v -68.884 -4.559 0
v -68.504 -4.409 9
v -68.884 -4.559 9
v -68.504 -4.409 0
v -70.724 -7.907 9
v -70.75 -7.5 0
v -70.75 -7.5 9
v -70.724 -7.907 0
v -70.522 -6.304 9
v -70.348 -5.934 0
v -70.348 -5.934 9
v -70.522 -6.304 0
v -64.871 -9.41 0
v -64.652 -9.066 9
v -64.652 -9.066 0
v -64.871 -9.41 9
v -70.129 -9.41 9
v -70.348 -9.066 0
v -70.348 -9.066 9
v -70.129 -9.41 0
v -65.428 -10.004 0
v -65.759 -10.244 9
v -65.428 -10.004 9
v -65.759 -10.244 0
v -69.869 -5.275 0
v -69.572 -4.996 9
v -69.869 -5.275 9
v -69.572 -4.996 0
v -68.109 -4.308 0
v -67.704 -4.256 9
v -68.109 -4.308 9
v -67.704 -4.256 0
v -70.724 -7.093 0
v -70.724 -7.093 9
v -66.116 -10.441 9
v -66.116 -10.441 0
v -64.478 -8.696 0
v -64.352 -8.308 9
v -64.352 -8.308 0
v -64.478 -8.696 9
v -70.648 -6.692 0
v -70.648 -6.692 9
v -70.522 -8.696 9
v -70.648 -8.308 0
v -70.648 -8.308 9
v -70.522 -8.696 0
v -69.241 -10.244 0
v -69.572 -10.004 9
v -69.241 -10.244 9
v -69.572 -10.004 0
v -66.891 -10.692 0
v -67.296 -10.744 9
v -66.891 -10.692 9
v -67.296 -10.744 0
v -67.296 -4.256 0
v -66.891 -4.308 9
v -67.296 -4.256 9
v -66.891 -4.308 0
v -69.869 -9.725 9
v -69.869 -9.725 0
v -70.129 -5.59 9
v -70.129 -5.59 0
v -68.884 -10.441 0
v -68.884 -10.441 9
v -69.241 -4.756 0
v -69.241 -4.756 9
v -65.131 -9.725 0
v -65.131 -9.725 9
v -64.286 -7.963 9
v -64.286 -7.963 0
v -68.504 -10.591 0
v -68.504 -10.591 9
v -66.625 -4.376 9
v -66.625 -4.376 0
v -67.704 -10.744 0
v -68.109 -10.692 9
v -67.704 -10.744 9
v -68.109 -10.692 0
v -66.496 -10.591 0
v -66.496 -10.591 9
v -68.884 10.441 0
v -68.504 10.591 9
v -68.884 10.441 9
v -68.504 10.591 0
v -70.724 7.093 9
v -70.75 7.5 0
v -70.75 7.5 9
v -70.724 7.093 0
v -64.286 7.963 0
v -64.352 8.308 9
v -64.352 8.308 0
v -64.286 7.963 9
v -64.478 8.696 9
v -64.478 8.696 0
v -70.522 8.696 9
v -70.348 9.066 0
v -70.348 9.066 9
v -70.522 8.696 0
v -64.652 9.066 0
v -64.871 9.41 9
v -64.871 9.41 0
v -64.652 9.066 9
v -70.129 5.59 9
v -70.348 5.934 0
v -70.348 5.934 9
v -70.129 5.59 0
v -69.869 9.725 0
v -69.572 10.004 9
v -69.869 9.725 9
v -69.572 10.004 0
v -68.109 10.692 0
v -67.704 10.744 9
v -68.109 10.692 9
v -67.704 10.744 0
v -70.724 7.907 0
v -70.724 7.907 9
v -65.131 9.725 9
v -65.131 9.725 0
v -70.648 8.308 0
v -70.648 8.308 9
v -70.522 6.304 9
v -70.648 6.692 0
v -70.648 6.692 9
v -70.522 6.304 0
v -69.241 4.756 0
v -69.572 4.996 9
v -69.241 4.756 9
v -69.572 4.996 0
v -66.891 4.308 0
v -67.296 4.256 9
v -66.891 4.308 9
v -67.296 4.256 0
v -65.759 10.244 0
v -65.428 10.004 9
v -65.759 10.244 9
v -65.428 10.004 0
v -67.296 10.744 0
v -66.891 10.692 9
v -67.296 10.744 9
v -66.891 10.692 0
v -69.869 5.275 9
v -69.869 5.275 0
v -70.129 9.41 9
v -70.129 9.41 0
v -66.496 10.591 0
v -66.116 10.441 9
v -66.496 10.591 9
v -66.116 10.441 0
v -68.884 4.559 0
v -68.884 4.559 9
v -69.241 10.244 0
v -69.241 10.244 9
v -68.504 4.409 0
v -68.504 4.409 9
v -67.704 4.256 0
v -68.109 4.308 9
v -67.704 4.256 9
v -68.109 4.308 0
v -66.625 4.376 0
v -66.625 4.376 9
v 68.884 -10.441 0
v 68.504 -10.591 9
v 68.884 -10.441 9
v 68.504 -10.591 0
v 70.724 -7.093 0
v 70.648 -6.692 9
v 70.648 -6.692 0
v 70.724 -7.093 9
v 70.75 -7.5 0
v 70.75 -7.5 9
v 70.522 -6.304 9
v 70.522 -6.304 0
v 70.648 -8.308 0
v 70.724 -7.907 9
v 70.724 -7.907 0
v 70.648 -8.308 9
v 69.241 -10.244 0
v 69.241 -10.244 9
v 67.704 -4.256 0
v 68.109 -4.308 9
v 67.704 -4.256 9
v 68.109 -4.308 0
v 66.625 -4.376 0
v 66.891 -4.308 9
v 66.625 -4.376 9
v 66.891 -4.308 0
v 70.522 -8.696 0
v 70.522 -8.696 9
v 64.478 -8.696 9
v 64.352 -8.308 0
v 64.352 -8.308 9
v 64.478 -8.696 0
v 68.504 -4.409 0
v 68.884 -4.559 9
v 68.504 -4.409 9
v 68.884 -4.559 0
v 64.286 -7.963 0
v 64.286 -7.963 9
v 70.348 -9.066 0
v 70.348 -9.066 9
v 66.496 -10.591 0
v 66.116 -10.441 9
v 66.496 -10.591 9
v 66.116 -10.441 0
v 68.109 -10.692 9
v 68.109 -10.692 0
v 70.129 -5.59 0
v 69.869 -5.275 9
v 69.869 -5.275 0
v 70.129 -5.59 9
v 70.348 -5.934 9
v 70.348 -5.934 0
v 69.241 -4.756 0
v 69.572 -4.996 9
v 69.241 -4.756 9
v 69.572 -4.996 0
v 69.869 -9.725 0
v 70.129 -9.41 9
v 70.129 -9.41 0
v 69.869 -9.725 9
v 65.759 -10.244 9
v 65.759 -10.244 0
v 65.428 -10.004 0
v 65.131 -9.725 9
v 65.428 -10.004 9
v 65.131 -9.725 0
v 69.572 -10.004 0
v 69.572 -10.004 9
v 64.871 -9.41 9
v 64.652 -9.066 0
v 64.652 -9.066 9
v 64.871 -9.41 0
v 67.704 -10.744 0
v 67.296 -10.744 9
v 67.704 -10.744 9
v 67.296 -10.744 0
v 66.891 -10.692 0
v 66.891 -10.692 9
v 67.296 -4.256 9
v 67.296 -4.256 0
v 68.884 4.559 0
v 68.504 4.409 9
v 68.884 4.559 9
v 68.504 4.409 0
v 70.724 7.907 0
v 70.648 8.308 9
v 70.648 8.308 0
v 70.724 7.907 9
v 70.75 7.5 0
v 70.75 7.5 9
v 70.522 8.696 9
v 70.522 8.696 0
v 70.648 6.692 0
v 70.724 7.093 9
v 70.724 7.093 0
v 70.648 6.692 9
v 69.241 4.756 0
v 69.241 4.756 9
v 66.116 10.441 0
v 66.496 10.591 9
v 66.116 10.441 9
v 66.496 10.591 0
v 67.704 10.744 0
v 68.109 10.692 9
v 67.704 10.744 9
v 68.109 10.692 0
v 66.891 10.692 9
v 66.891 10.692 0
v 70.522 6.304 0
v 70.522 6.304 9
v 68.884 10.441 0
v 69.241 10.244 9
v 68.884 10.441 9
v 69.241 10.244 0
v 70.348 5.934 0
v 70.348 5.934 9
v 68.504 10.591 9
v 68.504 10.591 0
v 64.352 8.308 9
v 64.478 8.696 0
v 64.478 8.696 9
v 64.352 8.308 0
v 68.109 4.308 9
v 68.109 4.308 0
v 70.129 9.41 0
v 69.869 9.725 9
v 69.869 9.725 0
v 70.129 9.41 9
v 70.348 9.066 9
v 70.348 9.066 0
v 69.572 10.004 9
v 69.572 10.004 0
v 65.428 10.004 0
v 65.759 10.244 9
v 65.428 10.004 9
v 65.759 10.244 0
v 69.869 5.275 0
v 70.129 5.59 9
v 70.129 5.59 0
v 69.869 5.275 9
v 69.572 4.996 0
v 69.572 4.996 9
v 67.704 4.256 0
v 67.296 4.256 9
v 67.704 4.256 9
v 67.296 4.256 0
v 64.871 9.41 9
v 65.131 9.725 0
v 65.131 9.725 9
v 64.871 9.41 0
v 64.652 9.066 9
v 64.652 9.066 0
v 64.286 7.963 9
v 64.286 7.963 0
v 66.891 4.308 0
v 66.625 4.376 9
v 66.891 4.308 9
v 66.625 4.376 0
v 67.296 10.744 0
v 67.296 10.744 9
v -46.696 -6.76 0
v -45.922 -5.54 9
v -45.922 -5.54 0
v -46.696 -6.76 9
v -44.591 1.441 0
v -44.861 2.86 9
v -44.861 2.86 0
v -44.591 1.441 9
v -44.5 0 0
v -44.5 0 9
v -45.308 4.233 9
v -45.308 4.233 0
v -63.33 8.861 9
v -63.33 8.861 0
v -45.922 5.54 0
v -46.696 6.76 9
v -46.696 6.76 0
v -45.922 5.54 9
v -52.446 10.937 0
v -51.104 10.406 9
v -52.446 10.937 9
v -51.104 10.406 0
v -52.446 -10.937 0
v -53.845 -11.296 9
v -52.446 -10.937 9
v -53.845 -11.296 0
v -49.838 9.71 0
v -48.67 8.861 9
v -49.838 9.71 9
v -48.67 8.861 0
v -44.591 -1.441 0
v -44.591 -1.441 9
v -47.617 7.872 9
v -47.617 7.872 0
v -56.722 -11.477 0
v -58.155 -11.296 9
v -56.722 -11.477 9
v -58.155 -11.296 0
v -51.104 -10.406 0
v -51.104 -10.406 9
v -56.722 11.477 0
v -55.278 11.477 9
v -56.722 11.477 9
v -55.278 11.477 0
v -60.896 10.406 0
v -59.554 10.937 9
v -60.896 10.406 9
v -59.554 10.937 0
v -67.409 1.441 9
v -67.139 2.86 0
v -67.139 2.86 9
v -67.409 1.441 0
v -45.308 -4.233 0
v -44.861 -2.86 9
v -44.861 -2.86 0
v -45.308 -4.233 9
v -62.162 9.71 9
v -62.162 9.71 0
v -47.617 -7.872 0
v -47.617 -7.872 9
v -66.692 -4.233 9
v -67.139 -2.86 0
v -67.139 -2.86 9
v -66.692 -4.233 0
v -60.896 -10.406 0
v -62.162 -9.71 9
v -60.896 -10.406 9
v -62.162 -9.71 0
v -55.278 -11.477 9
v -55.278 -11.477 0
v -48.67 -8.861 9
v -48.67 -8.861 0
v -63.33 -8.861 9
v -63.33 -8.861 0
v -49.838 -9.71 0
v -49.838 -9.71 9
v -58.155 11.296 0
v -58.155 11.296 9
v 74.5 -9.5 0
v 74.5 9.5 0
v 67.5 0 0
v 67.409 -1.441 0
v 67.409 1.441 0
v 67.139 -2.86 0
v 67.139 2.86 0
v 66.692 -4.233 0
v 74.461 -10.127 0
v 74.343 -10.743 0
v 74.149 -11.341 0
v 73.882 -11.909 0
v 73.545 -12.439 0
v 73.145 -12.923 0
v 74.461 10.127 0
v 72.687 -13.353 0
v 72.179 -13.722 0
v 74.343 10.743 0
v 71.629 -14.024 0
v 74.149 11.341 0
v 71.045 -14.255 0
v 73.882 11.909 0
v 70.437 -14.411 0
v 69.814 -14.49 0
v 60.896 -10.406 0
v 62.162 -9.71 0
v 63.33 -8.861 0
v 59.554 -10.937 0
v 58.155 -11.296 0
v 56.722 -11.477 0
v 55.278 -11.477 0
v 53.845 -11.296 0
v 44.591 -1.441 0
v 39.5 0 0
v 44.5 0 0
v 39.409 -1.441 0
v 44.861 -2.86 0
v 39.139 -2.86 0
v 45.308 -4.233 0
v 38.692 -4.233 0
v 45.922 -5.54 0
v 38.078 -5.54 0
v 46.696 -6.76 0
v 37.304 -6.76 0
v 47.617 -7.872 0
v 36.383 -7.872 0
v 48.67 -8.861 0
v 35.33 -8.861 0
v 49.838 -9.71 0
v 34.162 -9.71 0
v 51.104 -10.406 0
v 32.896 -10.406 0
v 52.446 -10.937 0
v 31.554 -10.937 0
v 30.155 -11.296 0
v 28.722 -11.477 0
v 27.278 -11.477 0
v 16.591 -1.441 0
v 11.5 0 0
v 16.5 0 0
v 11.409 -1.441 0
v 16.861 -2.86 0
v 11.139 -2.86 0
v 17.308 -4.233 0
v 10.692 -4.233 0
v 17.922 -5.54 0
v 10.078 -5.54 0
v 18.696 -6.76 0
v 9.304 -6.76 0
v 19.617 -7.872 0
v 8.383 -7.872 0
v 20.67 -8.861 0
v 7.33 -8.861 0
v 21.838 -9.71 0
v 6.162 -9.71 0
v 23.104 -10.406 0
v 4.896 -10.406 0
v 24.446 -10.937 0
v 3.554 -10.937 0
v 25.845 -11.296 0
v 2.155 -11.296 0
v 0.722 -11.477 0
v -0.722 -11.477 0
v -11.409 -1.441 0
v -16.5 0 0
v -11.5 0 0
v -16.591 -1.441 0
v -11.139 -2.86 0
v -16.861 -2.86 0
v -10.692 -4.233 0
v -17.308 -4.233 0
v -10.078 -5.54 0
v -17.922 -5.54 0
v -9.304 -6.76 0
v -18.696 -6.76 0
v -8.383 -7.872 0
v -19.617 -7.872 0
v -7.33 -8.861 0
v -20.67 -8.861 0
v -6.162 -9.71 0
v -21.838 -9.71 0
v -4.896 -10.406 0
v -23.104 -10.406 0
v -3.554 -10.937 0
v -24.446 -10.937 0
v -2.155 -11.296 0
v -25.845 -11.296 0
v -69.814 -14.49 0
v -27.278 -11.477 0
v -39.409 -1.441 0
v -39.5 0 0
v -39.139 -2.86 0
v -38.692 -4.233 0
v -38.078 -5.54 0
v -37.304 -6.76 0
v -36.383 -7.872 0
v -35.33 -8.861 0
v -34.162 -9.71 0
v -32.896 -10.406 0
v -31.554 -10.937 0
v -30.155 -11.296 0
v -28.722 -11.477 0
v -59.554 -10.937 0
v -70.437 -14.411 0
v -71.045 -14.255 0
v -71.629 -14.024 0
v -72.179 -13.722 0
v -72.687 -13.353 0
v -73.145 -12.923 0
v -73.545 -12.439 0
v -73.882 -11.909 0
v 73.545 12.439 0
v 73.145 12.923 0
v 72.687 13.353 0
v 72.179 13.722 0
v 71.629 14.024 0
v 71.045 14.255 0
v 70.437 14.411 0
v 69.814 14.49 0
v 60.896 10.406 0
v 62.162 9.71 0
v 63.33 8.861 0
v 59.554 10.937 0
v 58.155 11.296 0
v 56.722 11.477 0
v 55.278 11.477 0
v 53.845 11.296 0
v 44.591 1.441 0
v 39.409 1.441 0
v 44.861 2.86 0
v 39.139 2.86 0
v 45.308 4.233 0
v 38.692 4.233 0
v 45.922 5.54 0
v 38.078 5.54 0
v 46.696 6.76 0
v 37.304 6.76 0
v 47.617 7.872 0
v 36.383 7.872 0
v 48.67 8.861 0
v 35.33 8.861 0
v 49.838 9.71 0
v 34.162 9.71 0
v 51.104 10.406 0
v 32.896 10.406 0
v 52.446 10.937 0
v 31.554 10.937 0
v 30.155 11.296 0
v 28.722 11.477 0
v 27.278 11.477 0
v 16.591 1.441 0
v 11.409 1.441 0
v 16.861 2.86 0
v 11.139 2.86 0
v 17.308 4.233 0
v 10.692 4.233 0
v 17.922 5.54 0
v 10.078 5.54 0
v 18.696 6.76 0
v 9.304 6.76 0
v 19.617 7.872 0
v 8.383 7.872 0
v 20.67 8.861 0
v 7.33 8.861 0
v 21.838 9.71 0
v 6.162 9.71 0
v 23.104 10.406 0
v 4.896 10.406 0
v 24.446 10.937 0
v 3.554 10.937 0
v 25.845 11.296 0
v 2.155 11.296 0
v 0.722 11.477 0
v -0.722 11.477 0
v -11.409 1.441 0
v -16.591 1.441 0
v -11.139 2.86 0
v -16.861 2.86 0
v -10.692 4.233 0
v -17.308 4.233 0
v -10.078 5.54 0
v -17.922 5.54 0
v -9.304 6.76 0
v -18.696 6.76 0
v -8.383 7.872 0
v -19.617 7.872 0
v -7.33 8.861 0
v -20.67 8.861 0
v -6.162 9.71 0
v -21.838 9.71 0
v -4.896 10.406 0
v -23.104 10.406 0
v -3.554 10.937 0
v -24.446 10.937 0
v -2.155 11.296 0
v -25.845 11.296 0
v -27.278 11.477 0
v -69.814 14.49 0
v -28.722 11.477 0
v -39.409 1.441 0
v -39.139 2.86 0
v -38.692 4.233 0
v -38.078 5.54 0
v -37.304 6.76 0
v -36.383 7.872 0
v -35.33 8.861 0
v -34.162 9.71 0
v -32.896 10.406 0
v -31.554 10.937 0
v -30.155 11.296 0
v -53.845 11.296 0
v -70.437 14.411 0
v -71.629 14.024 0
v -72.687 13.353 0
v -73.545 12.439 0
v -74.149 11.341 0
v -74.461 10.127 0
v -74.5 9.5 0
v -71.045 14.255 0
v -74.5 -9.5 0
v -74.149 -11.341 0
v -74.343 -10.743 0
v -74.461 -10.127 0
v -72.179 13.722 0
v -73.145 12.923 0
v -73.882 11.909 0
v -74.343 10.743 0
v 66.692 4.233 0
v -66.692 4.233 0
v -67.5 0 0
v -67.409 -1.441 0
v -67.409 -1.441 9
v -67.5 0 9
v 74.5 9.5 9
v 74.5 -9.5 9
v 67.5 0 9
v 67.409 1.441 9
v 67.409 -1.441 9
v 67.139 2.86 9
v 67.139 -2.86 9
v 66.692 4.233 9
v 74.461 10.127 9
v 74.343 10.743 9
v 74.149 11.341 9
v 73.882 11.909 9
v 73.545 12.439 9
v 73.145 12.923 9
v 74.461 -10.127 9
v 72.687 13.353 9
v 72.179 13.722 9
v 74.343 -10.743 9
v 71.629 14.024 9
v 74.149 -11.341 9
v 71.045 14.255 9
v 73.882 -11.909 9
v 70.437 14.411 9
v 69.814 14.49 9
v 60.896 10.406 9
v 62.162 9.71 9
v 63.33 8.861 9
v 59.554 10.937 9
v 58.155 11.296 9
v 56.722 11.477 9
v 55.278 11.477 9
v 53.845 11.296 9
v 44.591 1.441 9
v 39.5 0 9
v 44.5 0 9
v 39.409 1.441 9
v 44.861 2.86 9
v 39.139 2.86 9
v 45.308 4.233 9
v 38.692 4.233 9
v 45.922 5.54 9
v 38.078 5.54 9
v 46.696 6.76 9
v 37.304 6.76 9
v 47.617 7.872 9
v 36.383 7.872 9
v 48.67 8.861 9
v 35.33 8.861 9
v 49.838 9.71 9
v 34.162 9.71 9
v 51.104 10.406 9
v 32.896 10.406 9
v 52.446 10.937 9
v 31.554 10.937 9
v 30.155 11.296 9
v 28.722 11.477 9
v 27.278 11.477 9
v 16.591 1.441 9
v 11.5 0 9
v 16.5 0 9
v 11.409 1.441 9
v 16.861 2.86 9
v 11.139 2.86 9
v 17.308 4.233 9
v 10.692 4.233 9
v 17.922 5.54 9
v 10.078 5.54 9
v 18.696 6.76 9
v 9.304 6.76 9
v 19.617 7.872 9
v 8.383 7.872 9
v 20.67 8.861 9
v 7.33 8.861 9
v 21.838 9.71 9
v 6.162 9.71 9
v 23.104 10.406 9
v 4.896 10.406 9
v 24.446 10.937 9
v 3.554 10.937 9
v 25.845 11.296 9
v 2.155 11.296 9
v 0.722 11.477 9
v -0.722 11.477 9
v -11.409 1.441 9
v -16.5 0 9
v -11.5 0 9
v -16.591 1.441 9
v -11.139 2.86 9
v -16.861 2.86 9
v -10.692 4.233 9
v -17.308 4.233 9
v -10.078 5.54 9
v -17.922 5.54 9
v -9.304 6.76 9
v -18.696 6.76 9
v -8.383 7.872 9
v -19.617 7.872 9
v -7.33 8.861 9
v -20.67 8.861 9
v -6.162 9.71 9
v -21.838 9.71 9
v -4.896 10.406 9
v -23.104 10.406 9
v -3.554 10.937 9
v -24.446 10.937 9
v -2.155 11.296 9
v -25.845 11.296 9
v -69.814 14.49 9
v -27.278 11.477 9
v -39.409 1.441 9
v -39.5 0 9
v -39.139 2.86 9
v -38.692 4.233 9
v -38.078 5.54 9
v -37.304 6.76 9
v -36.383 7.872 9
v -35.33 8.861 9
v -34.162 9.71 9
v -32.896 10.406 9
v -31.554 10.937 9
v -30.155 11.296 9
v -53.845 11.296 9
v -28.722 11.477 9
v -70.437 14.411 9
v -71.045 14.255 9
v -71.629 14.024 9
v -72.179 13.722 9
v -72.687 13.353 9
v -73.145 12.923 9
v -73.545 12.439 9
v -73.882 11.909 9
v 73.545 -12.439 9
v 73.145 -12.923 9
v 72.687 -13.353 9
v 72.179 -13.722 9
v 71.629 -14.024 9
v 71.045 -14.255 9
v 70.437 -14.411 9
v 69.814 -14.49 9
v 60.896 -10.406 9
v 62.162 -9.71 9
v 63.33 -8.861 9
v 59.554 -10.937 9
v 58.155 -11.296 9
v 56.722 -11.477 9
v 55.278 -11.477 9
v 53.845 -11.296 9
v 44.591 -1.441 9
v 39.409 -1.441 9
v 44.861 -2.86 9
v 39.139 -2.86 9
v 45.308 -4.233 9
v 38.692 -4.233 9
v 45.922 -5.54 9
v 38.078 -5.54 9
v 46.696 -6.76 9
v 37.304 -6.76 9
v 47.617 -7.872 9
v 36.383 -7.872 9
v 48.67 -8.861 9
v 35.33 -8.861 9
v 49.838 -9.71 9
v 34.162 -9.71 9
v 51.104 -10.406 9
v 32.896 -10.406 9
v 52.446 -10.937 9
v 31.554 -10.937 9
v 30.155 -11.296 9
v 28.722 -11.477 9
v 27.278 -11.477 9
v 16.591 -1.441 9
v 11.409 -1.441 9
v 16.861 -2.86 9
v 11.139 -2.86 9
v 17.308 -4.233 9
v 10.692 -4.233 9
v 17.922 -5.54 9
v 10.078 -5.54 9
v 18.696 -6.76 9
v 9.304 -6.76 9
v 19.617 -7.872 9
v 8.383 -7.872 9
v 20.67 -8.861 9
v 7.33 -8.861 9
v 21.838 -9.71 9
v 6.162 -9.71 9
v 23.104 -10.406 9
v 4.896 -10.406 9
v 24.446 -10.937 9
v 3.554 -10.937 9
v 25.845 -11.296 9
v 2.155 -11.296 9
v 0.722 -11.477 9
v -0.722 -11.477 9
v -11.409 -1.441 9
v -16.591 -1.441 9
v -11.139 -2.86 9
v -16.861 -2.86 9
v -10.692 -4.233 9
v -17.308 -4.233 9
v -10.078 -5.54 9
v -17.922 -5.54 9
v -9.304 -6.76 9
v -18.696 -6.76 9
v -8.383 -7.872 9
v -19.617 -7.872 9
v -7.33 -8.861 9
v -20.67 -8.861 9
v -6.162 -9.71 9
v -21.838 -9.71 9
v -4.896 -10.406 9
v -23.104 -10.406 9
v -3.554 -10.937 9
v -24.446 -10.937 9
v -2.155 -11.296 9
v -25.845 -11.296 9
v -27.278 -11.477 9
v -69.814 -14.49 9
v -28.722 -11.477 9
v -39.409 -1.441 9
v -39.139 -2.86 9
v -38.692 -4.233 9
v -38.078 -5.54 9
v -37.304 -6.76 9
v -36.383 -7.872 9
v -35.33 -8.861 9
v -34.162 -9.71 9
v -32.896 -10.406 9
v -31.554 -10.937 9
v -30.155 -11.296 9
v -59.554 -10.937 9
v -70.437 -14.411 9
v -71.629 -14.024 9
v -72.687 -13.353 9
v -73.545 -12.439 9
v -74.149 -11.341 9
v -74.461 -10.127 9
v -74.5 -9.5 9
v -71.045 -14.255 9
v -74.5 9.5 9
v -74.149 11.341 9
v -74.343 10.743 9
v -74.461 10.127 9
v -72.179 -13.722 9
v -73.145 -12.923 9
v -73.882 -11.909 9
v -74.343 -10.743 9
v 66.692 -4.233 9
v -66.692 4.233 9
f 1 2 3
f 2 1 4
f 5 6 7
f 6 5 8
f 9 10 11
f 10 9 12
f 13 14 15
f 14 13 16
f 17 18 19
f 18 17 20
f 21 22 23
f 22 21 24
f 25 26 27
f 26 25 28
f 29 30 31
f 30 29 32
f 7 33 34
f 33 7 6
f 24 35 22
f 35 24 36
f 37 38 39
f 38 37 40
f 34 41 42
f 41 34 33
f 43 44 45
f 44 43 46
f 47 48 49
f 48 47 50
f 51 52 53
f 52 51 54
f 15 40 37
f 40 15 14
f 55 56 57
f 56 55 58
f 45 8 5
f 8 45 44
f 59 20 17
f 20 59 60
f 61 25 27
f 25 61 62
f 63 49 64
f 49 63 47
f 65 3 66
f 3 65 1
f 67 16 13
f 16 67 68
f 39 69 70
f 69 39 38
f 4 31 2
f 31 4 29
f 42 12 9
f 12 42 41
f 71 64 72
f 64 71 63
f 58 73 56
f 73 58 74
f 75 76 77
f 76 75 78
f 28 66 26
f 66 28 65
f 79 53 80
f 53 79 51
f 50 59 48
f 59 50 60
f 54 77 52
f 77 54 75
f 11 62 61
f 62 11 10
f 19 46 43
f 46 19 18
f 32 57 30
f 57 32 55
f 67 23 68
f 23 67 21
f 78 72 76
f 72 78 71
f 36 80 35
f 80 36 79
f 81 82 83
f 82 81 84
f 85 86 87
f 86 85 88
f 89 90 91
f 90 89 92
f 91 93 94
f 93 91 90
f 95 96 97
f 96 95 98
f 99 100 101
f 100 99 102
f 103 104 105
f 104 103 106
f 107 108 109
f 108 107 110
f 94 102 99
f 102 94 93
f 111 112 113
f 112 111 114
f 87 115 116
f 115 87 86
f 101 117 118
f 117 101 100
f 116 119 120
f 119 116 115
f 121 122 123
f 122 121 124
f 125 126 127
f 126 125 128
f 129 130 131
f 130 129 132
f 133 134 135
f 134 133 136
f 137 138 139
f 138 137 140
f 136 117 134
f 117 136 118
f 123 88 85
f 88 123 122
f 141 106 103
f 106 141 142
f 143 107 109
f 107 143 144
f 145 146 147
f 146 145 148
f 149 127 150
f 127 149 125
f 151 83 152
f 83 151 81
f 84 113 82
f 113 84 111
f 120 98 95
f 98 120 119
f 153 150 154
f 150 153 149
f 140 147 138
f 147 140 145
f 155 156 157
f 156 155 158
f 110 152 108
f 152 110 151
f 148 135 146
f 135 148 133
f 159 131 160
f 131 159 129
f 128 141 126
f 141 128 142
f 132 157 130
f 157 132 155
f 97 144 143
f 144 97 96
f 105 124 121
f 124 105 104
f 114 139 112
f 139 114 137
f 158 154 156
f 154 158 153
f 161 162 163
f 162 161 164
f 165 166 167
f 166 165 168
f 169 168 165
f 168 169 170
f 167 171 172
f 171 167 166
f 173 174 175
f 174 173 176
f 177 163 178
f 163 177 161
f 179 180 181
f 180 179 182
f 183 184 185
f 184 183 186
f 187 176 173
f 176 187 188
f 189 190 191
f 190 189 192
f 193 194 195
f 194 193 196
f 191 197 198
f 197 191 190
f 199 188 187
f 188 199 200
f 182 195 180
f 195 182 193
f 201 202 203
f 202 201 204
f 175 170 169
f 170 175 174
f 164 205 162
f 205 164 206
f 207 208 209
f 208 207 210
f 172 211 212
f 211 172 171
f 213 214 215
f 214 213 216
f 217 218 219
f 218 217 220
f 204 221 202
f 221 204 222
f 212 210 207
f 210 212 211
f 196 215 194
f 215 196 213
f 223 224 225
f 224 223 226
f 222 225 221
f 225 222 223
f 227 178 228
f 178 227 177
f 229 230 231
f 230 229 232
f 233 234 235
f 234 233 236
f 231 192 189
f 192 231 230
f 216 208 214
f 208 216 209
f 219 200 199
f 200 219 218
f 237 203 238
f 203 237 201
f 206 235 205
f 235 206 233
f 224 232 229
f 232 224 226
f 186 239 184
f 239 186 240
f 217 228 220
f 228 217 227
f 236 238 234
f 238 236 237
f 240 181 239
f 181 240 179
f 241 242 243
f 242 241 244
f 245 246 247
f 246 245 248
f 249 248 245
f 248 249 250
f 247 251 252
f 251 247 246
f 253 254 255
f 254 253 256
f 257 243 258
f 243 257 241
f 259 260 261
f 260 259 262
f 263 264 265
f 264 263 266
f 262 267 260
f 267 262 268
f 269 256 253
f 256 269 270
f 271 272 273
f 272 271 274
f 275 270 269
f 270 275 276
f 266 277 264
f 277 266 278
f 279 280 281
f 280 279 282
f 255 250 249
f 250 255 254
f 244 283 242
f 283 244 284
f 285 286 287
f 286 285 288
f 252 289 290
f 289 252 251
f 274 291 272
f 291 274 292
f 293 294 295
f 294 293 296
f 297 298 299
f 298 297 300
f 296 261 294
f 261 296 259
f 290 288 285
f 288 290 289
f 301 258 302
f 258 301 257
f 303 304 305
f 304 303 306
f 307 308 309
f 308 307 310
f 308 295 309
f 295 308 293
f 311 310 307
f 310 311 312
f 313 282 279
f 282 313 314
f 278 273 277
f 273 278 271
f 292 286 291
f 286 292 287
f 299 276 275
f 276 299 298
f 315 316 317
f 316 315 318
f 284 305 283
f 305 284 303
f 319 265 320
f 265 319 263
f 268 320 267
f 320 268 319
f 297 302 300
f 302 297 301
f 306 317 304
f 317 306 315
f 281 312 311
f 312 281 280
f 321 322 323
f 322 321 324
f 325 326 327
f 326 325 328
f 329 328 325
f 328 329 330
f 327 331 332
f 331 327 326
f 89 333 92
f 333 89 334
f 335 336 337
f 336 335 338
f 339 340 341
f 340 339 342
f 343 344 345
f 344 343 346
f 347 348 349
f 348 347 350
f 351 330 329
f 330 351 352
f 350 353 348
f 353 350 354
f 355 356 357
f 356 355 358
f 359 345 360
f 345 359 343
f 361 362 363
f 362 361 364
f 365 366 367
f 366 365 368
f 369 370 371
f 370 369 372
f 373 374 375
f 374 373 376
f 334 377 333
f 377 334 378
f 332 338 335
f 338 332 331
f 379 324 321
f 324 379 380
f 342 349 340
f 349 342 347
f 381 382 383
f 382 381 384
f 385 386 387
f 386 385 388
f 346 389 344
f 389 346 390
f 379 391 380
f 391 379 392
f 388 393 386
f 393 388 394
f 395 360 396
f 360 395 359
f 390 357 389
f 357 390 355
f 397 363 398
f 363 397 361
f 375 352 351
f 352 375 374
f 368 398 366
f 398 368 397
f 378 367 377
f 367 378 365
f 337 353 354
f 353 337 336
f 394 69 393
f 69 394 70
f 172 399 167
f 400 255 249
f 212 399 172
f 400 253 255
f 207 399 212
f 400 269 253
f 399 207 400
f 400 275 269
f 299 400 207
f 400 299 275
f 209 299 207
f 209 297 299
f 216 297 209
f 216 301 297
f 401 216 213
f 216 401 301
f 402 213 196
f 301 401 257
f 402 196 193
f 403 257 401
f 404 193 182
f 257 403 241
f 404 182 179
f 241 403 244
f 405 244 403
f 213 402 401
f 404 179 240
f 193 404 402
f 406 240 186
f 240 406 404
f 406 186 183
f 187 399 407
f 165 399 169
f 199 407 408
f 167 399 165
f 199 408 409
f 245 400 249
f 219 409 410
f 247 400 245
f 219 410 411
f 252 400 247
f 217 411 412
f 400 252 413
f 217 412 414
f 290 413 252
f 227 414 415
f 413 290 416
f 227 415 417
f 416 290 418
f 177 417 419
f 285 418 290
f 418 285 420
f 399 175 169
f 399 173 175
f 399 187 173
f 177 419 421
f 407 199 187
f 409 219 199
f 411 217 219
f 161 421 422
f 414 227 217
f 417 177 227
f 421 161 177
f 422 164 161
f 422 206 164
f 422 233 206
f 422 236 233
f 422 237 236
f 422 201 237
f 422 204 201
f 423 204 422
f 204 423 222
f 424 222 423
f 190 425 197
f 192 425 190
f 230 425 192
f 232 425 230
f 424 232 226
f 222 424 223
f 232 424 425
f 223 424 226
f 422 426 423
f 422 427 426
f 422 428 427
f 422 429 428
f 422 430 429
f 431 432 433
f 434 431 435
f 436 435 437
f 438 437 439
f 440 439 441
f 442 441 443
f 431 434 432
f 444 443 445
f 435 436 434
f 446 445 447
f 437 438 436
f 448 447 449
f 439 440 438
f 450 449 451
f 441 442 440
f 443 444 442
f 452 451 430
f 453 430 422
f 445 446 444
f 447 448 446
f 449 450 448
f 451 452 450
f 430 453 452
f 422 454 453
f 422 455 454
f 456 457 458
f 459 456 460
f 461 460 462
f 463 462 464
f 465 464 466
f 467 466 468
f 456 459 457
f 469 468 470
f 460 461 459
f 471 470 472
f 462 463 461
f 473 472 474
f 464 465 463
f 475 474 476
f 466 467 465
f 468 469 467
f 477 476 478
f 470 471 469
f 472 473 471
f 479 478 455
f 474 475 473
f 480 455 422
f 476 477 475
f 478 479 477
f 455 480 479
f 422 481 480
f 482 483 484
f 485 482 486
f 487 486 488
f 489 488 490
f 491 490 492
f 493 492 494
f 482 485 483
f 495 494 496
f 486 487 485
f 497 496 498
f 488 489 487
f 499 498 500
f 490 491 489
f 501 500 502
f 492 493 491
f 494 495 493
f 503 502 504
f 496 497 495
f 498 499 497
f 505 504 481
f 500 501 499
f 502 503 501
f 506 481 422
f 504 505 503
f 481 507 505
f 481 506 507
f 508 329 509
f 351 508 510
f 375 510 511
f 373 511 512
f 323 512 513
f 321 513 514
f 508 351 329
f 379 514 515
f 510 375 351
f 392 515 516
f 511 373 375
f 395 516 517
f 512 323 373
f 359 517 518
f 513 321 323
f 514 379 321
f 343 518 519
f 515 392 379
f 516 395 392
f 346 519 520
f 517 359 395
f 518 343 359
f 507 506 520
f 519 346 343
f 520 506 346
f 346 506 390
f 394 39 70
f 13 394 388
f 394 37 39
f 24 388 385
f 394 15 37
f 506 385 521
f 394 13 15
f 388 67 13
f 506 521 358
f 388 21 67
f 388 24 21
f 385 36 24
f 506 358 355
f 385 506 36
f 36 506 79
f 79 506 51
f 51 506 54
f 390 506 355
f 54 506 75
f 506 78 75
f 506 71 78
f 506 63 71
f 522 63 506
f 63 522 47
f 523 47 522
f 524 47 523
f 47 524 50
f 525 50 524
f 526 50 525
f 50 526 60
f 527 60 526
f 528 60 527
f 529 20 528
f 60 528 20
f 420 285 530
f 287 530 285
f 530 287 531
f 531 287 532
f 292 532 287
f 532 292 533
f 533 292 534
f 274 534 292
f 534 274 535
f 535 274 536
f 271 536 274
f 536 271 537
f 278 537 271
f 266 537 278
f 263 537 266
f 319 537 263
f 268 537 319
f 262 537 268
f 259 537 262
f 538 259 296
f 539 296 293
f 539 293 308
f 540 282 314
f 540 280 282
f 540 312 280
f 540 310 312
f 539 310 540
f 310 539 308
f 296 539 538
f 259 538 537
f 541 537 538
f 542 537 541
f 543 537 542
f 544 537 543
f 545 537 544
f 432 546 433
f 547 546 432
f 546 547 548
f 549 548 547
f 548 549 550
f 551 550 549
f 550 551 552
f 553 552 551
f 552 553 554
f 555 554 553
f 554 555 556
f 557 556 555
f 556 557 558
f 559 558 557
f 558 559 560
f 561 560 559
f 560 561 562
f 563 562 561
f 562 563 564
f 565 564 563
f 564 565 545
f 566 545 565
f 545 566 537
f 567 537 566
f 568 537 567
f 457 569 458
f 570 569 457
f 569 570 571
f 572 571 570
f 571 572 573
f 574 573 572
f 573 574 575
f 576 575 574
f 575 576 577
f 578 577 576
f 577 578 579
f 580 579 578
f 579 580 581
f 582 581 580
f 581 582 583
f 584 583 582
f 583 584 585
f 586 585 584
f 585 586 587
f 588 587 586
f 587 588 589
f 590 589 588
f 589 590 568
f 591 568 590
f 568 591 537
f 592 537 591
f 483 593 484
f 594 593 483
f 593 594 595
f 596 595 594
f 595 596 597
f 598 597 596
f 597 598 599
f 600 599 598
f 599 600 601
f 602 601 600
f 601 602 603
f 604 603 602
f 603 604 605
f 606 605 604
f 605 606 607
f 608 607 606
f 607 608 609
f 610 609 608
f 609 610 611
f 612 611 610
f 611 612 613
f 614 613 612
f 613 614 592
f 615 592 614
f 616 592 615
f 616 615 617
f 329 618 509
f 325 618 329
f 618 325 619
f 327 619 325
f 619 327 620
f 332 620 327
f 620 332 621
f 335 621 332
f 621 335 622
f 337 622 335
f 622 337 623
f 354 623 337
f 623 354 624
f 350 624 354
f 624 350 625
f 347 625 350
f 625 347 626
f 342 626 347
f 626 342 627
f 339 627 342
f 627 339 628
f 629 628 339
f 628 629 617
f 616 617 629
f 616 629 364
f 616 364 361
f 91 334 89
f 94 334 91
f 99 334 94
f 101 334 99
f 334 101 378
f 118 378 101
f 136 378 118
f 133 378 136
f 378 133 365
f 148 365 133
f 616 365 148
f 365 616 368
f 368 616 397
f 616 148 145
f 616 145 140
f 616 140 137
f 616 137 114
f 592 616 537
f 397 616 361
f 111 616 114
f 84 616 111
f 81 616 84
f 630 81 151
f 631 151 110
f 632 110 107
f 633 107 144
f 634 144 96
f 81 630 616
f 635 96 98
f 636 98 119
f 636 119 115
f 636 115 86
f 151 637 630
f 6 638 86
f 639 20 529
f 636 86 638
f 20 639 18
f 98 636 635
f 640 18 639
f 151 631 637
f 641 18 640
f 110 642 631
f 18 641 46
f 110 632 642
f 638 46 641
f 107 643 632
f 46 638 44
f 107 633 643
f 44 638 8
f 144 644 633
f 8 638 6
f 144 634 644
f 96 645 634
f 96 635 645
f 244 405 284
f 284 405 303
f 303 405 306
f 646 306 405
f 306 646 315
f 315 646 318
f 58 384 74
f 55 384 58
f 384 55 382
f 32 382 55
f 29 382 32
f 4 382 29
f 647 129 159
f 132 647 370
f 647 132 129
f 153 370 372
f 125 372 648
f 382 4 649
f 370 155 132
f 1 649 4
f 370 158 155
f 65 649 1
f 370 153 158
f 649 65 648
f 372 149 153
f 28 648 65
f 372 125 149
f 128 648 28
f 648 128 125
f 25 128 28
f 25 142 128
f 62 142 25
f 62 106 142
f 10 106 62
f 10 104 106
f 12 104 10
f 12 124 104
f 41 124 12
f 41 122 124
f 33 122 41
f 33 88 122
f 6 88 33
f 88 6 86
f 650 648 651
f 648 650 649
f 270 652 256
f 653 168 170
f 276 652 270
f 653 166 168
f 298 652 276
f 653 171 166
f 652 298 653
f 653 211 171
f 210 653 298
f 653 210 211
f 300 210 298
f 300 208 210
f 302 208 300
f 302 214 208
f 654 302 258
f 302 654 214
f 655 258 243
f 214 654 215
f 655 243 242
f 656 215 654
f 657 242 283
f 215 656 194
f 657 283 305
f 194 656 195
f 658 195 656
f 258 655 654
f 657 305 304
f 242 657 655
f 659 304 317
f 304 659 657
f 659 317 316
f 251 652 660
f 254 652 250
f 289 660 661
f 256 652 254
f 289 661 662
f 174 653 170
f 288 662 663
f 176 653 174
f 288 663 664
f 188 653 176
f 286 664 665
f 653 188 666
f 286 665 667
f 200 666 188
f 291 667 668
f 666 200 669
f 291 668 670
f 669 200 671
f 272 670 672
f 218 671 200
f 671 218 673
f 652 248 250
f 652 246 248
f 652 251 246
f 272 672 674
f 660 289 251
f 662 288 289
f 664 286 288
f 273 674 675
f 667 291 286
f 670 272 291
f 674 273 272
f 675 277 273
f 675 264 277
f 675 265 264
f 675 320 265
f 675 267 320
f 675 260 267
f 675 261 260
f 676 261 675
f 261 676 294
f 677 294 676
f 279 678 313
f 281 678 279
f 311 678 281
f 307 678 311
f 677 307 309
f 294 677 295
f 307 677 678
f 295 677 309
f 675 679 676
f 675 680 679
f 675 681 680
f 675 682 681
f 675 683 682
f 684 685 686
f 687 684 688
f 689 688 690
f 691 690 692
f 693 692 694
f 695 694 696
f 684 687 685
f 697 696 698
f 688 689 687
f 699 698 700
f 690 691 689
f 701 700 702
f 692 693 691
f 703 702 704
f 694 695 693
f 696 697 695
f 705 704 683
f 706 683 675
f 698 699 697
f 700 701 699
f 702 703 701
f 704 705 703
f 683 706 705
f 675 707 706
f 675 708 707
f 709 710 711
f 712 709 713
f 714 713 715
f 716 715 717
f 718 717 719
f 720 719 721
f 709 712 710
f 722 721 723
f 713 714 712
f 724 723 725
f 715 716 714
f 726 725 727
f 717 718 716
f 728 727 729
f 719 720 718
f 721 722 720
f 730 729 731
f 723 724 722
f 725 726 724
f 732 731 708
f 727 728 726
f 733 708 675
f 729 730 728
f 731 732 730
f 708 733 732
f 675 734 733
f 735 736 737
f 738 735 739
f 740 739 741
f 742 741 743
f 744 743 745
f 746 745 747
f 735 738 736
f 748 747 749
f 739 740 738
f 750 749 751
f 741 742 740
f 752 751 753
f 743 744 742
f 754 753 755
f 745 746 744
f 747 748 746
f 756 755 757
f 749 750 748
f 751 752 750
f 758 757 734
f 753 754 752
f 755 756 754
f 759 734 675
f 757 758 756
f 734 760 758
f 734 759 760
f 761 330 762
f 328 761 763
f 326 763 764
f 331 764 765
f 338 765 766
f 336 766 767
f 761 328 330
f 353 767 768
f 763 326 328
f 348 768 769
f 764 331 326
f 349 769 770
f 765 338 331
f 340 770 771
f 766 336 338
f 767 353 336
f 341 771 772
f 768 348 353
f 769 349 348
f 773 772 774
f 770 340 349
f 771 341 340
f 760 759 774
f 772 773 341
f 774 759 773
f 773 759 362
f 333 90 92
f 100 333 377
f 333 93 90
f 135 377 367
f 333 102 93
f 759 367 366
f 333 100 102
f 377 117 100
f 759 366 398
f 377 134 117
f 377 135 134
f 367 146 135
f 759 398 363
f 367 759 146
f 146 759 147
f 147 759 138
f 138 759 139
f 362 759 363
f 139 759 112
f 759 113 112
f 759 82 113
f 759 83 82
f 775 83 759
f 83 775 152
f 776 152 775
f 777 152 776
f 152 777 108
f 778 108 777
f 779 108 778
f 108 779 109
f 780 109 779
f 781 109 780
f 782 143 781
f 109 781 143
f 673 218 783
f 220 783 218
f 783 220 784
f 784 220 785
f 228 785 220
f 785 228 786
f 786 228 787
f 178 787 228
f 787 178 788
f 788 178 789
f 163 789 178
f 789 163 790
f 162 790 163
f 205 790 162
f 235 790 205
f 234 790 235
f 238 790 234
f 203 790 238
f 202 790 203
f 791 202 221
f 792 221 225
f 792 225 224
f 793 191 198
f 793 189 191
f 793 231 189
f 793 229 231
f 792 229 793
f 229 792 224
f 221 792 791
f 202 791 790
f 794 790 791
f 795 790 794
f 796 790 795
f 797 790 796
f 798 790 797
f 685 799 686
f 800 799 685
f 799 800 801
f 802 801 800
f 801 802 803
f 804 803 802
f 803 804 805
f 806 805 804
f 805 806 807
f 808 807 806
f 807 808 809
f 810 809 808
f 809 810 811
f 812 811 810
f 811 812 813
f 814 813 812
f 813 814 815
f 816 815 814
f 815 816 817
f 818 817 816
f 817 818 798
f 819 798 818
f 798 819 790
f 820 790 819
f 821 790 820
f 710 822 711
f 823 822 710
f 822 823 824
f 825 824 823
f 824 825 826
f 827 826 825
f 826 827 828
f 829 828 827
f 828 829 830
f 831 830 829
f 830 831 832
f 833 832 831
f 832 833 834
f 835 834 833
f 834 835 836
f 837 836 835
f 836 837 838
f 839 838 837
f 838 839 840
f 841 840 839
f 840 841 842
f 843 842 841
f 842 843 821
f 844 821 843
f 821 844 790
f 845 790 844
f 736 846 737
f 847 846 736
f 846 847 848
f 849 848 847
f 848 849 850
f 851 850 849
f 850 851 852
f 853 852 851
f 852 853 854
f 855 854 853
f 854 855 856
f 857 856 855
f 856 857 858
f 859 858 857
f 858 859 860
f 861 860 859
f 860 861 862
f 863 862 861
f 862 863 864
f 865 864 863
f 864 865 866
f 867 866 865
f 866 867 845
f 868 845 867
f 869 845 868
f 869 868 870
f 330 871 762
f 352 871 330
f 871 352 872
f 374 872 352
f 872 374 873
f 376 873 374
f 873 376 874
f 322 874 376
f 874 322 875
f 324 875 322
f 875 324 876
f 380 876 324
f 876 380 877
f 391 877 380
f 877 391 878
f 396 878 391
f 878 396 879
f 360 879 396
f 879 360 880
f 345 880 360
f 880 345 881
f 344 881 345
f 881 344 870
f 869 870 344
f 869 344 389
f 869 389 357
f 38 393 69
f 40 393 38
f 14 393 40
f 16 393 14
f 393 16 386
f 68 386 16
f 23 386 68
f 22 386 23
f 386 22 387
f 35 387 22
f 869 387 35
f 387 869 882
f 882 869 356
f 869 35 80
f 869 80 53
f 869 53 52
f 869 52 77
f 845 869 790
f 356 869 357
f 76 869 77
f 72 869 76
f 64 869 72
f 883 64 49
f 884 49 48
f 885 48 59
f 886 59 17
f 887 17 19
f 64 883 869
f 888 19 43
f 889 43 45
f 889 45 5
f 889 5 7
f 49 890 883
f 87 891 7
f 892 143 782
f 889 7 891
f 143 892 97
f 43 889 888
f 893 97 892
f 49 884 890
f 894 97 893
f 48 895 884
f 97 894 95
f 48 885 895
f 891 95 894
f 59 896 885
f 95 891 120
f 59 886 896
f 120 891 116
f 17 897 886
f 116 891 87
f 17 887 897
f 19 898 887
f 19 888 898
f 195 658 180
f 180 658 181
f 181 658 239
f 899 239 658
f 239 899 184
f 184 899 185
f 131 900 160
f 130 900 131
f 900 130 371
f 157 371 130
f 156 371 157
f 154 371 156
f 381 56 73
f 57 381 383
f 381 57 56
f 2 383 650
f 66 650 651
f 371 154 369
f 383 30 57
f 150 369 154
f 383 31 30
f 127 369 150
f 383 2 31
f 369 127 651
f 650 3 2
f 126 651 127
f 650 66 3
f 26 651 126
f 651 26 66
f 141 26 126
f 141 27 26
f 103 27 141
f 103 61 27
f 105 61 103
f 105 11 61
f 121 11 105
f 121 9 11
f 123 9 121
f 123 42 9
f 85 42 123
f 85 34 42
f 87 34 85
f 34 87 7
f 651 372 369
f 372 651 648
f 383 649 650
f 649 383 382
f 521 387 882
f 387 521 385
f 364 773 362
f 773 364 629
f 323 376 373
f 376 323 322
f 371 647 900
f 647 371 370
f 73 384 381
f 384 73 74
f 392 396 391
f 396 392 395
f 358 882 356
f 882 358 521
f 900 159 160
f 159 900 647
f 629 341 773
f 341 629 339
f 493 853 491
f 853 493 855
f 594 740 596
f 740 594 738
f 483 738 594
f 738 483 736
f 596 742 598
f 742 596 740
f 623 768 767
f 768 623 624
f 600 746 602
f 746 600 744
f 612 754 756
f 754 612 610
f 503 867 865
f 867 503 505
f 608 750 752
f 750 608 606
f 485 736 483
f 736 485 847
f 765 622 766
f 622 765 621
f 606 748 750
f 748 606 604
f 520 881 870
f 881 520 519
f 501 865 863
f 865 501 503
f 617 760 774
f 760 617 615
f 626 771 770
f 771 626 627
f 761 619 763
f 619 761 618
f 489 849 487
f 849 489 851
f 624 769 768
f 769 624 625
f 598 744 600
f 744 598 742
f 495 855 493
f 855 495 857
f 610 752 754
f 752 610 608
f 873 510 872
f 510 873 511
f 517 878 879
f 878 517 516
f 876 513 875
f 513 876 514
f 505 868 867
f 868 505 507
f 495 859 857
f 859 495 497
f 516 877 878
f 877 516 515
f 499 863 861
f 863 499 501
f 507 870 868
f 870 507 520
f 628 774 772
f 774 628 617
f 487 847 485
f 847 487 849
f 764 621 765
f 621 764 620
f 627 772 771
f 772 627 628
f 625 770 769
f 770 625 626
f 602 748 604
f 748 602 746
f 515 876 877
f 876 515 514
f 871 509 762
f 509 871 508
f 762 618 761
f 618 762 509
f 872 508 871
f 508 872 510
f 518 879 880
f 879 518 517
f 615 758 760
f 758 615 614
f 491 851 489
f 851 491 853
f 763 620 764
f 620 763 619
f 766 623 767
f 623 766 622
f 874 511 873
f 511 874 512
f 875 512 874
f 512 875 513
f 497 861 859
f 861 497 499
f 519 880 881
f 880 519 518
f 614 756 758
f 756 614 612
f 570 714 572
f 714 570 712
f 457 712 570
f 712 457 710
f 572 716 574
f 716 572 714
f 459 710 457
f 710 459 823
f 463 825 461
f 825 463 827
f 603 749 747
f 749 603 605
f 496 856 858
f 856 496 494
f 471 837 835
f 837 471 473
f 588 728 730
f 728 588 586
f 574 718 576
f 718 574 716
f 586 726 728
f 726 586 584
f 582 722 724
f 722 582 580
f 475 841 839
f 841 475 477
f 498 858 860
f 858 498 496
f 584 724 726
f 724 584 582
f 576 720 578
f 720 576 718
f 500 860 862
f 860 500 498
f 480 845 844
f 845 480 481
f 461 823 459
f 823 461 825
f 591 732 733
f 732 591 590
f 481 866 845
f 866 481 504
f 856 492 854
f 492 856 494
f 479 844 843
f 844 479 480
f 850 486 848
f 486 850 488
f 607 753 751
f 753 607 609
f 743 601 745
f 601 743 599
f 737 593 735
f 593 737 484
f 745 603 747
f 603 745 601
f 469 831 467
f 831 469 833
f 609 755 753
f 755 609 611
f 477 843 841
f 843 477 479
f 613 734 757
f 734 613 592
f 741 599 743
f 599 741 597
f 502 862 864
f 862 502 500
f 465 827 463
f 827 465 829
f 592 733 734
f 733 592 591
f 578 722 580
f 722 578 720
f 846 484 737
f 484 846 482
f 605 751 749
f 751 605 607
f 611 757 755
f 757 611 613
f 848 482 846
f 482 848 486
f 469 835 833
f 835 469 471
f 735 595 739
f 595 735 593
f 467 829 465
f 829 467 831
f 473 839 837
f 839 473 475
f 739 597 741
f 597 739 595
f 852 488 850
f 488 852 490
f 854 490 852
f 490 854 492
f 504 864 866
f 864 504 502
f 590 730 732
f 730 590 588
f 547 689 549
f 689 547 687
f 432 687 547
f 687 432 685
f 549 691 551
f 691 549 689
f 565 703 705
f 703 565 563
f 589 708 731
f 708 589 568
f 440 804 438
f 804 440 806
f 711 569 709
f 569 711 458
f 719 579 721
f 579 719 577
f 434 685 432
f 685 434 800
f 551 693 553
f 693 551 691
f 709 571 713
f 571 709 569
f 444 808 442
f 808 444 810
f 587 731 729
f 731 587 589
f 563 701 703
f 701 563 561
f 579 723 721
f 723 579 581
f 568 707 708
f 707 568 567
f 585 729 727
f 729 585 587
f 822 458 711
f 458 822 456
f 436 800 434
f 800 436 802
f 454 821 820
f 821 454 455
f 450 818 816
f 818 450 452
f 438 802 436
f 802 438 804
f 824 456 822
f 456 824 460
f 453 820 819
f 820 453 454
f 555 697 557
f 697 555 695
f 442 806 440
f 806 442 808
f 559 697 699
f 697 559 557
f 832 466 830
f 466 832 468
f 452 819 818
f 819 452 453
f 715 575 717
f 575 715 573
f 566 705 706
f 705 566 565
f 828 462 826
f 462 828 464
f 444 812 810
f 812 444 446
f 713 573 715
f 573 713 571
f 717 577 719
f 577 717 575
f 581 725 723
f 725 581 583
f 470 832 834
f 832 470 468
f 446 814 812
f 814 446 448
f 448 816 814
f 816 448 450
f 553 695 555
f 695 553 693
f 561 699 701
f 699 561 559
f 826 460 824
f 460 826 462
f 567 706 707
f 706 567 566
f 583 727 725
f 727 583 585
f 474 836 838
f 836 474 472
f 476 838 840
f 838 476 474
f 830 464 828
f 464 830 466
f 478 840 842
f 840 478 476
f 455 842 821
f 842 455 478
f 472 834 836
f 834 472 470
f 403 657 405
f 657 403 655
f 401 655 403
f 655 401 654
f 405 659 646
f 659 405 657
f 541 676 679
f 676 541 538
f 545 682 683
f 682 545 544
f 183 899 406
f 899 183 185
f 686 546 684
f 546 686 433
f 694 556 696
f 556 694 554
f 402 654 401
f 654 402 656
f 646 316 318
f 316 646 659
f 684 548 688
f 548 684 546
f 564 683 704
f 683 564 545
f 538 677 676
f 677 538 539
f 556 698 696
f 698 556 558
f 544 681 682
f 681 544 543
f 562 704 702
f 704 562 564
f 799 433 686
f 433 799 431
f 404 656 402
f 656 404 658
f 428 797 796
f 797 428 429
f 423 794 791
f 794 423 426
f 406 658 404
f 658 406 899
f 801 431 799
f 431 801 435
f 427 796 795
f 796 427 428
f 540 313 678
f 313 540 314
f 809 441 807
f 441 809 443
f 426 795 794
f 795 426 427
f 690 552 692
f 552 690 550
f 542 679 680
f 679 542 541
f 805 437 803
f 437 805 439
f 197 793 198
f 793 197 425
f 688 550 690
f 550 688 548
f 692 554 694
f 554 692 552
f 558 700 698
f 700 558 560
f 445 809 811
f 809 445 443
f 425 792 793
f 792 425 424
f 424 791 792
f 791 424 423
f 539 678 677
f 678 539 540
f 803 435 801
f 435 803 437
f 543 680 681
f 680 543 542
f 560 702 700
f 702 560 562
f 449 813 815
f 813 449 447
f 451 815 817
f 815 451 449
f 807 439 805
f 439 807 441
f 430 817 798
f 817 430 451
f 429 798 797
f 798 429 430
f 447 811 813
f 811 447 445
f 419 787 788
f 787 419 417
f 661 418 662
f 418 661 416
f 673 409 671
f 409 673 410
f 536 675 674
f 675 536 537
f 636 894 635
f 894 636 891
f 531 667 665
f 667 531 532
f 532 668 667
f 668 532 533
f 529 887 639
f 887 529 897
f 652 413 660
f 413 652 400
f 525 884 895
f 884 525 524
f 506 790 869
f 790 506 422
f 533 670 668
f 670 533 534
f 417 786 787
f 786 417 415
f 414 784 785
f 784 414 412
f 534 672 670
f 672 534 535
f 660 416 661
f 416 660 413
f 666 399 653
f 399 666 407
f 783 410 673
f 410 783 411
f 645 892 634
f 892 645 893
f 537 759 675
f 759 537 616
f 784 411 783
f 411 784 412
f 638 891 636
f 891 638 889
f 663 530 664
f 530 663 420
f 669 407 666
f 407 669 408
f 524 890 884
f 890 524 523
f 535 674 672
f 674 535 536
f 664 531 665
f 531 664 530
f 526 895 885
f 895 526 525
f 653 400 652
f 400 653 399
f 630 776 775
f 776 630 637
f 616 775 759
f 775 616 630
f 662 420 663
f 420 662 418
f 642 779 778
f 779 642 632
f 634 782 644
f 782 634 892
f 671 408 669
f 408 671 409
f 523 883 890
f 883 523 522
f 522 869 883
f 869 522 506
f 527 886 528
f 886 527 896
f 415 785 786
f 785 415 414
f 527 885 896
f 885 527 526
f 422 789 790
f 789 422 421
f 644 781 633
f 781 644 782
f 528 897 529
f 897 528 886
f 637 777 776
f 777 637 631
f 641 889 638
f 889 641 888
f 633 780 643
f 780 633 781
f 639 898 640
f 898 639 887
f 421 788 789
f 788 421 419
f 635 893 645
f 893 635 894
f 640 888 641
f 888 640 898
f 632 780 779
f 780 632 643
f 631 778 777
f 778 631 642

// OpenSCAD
$fn = 50;

difference() {
	union() {
		hull() {
			translate(v = [-69.5, 9.5, 0]) {
				cylinder(h = 9, r = 5);
			}
			translate(v = [69.5, 9.5, 0]) {
				cylinder(h = 9, r = 5);
			}
			translate(v = [-69.5, -9.5, 0]) {
				cylinder(h = 9, r = 5);
			}
			translate(v = [69.5, -9.5, 0]) {
				cylinder(h = 9, r = 5);
			}
		}
	}
	union() {
		translate(v = [-67.5, -7.5, -100.0]) {
			cylinder(h = 200, r = 3.25);
		}
		translate(v = [-67.5, 7.5, -100.0]) {
			cylinder(h = 200, r = 3.25);
		}
		translate(v = [67.5, -7.5, -100.0]) {
			cylinder(h = 200, r = 3.25);
		}
		translate(v = [67.5, 7.5, -100.0]) {
			cylinder(h = 200, r = 3.25);
		}
		translate(v = [-67.5, -7.5, -100.0]) {
			cylinder(h = 200, r = 1.8);
		}
		translate(v = [-67.5, 7.5, -100.0]) {
			cylinder(h = 200, r = 1.8);
		}
		translate(v = [67.5, -7.5, -100.0]) {
			cylinder(h = 200, r = 1.8);
		}
		translate(v = [67.5, 7.5, -100.0]) {
			cylinder(h = 200, r = 1.8);
		}
		translate(v = [-56.0, 0, 0.0]) {
			cylinder(h = 9, r = 11.5);
		}
		translate(v = [-28.0, 0, 0.0]) {
			cylinder(h = 9, r = 11.5);
		}
		cylinder(h = 9, r = 11.5);
		translate(v = [28.0, 0, 0.0]) {
			cylinder(h = 9, r = 11.5);
		}
		translate(v = [56.0, 0, 0.0]) {
			cylinder(h = 9, r = 11.5);
		}
	}
}
